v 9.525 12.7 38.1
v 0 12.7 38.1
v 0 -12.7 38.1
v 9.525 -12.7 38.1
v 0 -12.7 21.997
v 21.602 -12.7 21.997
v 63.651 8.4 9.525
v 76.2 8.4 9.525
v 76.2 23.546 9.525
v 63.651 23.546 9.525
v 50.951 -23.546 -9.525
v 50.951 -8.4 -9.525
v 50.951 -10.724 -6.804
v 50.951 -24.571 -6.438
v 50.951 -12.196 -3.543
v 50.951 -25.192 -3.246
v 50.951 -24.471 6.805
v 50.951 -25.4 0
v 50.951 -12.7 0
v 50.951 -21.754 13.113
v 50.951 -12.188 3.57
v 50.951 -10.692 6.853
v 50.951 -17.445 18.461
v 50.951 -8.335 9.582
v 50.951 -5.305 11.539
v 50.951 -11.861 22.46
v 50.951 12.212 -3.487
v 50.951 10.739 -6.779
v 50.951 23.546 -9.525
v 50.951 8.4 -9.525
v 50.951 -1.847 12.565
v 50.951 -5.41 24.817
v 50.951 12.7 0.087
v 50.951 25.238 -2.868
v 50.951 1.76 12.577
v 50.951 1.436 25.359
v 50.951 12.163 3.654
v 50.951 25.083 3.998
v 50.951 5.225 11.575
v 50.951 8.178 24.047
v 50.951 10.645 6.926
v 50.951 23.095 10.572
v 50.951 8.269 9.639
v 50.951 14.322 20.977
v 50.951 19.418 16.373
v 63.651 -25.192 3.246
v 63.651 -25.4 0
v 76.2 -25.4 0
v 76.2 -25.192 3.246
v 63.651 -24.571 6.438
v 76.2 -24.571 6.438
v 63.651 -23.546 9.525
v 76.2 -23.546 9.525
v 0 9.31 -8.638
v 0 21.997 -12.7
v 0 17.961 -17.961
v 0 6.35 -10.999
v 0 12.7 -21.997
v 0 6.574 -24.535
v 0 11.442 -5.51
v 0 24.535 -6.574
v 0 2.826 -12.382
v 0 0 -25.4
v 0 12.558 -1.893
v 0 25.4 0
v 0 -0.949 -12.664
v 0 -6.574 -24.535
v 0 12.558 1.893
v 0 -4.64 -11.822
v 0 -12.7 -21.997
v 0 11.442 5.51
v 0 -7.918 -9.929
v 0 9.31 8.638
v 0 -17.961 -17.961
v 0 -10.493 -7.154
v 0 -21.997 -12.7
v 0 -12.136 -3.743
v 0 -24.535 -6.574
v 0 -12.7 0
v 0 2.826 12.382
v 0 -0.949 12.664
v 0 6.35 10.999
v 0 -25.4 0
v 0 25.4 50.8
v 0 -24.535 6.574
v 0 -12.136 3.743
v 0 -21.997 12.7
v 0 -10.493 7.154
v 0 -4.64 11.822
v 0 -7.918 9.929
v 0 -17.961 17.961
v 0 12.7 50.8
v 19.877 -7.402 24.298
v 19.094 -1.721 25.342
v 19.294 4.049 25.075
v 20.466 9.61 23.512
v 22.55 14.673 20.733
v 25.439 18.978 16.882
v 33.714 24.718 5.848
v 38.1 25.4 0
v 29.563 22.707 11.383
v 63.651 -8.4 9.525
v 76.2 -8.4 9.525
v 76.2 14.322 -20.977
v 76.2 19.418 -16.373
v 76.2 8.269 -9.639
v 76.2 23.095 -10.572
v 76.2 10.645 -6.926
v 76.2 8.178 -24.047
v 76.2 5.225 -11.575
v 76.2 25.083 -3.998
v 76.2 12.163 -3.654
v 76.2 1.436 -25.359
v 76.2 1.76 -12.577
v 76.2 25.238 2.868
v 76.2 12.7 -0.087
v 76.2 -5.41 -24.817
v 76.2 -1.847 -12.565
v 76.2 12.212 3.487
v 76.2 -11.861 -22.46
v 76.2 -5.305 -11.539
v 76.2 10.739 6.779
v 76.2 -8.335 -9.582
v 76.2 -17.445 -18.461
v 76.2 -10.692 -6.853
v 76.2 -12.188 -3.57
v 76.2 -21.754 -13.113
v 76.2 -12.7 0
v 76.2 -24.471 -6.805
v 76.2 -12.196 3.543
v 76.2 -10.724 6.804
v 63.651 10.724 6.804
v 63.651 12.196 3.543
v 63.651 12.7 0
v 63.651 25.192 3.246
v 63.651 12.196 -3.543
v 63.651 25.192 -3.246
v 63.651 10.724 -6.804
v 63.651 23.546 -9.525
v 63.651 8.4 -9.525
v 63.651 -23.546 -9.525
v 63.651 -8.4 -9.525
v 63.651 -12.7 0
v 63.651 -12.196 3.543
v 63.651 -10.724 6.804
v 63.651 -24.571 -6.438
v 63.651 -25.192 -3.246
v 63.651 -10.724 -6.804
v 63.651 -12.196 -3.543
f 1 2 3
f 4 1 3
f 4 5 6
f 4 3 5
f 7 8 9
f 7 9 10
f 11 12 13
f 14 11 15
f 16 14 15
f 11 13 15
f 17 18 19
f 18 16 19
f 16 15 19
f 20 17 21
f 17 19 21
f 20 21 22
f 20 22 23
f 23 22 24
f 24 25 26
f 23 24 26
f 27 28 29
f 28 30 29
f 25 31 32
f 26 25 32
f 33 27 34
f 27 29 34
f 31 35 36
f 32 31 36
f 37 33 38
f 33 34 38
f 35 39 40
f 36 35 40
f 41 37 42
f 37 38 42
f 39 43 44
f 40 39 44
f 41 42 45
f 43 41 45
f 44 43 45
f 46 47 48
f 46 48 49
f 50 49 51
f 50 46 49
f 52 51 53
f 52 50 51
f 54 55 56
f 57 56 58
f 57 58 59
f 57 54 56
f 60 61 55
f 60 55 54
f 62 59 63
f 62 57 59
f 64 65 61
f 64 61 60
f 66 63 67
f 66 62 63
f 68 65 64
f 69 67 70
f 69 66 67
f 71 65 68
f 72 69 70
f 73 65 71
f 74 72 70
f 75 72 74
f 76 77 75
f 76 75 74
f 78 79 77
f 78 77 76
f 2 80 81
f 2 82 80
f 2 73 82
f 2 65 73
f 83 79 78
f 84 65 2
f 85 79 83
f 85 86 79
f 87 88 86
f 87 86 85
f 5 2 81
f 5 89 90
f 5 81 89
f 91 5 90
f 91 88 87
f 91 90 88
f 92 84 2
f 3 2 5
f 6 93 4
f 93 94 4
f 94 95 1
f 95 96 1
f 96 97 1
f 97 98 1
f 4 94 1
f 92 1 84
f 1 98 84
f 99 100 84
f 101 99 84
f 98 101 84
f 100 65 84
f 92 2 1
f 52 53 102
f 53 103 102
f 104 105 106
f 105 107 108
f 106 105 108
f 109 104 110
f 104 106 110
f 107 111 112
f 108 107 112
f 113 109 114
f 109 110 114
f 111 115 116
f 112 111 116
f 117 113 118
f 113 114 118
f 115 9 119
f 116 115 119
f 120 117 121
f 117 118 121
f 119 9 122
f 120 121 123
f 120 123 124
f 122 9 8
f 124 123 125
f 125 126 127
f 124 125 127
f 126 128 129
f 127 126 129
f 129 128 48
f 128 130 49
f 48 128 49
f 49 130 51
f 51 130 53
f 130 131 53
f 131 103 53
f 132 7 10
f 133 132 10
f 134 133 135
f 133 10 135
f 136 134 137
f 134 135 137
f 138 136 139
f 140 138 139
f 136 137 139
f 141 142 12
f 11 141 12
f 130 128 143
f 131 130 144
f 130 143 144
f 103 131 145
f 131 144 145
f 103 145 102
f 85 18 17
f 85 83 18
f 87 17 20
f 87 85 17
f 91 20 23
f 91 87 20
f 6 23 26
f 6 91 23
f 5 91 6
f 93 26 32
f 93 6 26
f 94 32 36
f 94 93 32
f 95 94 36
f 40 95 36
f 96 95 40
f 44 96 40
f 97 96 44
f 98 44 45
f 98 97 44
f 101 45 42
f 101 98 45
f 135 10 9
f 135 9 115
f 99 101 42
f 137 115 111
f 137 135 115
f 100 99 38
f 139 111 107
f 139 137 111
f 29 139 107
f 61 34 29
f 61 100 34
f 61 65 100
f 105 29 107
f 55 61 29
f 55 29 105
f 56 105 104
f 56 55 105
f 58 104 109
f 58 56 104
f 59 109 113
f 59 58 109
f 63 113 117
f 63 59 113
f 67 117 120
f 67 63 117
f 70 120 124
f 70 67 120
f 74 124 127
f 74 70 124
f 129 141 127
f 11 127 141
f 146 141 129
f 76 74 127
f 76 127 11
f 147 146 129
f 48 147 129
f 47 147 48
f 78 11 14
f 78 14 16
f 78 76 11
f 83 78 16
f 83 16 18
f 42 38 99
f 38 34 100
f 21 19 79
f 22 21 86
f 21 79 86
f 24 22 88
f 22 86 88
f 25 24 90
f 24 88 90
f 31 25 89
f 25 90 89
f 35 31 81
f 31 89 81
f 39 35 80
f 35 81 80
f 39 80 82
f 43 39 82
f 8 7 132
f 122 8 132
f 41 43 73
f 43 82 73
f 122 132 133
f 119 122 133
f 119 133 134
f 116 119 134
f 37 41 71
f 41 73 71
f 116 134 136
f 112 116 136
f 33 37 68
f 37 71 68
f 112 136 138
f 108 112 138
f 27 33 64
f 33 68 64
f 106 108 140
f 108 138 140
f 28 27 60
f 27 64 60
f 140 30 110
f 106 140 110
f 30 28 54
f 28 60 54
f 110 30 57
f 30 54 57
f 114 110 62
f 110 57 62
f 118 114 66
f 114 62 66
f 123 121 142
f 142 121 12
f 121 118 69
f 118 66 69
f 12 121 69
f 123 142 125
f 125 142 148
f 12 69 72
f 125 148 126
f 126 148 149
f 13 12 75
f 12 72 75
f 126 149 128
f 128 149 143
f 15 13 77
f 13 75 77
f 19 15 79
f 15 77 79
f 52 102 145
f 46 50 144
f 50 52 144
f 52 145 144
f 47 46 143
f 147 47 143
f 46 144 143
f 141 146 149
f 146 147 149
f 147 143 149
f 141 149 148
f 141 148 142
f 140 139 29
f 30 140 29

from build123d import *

# Parameters (mm, degrees)
F1_DEPTH  = 25.4
F3_DEPTH  = 12.7
F4_R      = 25.4
F5_DEPTH  = 76.2
F6_R      = 12.7
F7_DEPTH  = 76.201
F8_W      = 25.4
F8_H      = 12.7
F9_DEPTH  = 76.201
F11_DEPTH = 50.801


with BuildPart() as f1:
    # F0 (on Front) → F1 (new body)
    with BuildSketch(Plane.XZ):
        Polygon((0, 50.8), (0, 0), (38.1, 0), align=None)
    extrude(amount=-F1_DEPTH)

    # F2 (on face) → F3 (join)
    with BuildSketch(Plane.XZ):
        Polygon((38.1, 0), (0, 50.8), (0, 0), align=None)
    extrude(amount=F3_DEPTH)

    # F4 (on face) → F5 (join)
    with BuildSketch(Plane(origin=(0, 0, 0), x_dir=(0, -1, 0), z_dir=(-1, 0, 0))):
        Circle(F4_R)
    extrude(amount=-F5_DEPTH)

    # F6 (on face) → F7 (cut, through all)
    with BuildSketch(Plane(origin=(0, 0, 0), x_dir=(0, -1, 0), z_dir=(-1, 0, 0))):
        Circle(F6_R)
    extrude(amount=-F7_DEPTH, mode=Mode.SUBTRACT)

    # F8 (on face) → F9 (cut, through all)
    with BuildSketch(Plane(origin=(0, 0, 0), x_dir=(0, -1, 0), z_dir=(-1, 0, 0))):
        with Locations((0, 44.45)):
            Rectangle(F8_W, F8_H)
    extrude(amount=-F9_DEPTH, mode=Mode.SUBTRACT)

    # F10 (on face) → F11 (cut, through all)
    with BuildSketch(Plane(origin=(0, 25.4, 0), x_dir=(-1, 0, 0), z_dir=(0, 1, 0))):
        Polygon((-50.951158, 25.4), (-76.351158, 25.4), (-76.351158, 9.525), (-63.651158, 9.525), (-63.651158, -9.525), (-50.951158, -9.525), align=None)
    extrude(amount=-F11_DEPTH, mode=Mode.SUBTRACT)


solid = f1.part
